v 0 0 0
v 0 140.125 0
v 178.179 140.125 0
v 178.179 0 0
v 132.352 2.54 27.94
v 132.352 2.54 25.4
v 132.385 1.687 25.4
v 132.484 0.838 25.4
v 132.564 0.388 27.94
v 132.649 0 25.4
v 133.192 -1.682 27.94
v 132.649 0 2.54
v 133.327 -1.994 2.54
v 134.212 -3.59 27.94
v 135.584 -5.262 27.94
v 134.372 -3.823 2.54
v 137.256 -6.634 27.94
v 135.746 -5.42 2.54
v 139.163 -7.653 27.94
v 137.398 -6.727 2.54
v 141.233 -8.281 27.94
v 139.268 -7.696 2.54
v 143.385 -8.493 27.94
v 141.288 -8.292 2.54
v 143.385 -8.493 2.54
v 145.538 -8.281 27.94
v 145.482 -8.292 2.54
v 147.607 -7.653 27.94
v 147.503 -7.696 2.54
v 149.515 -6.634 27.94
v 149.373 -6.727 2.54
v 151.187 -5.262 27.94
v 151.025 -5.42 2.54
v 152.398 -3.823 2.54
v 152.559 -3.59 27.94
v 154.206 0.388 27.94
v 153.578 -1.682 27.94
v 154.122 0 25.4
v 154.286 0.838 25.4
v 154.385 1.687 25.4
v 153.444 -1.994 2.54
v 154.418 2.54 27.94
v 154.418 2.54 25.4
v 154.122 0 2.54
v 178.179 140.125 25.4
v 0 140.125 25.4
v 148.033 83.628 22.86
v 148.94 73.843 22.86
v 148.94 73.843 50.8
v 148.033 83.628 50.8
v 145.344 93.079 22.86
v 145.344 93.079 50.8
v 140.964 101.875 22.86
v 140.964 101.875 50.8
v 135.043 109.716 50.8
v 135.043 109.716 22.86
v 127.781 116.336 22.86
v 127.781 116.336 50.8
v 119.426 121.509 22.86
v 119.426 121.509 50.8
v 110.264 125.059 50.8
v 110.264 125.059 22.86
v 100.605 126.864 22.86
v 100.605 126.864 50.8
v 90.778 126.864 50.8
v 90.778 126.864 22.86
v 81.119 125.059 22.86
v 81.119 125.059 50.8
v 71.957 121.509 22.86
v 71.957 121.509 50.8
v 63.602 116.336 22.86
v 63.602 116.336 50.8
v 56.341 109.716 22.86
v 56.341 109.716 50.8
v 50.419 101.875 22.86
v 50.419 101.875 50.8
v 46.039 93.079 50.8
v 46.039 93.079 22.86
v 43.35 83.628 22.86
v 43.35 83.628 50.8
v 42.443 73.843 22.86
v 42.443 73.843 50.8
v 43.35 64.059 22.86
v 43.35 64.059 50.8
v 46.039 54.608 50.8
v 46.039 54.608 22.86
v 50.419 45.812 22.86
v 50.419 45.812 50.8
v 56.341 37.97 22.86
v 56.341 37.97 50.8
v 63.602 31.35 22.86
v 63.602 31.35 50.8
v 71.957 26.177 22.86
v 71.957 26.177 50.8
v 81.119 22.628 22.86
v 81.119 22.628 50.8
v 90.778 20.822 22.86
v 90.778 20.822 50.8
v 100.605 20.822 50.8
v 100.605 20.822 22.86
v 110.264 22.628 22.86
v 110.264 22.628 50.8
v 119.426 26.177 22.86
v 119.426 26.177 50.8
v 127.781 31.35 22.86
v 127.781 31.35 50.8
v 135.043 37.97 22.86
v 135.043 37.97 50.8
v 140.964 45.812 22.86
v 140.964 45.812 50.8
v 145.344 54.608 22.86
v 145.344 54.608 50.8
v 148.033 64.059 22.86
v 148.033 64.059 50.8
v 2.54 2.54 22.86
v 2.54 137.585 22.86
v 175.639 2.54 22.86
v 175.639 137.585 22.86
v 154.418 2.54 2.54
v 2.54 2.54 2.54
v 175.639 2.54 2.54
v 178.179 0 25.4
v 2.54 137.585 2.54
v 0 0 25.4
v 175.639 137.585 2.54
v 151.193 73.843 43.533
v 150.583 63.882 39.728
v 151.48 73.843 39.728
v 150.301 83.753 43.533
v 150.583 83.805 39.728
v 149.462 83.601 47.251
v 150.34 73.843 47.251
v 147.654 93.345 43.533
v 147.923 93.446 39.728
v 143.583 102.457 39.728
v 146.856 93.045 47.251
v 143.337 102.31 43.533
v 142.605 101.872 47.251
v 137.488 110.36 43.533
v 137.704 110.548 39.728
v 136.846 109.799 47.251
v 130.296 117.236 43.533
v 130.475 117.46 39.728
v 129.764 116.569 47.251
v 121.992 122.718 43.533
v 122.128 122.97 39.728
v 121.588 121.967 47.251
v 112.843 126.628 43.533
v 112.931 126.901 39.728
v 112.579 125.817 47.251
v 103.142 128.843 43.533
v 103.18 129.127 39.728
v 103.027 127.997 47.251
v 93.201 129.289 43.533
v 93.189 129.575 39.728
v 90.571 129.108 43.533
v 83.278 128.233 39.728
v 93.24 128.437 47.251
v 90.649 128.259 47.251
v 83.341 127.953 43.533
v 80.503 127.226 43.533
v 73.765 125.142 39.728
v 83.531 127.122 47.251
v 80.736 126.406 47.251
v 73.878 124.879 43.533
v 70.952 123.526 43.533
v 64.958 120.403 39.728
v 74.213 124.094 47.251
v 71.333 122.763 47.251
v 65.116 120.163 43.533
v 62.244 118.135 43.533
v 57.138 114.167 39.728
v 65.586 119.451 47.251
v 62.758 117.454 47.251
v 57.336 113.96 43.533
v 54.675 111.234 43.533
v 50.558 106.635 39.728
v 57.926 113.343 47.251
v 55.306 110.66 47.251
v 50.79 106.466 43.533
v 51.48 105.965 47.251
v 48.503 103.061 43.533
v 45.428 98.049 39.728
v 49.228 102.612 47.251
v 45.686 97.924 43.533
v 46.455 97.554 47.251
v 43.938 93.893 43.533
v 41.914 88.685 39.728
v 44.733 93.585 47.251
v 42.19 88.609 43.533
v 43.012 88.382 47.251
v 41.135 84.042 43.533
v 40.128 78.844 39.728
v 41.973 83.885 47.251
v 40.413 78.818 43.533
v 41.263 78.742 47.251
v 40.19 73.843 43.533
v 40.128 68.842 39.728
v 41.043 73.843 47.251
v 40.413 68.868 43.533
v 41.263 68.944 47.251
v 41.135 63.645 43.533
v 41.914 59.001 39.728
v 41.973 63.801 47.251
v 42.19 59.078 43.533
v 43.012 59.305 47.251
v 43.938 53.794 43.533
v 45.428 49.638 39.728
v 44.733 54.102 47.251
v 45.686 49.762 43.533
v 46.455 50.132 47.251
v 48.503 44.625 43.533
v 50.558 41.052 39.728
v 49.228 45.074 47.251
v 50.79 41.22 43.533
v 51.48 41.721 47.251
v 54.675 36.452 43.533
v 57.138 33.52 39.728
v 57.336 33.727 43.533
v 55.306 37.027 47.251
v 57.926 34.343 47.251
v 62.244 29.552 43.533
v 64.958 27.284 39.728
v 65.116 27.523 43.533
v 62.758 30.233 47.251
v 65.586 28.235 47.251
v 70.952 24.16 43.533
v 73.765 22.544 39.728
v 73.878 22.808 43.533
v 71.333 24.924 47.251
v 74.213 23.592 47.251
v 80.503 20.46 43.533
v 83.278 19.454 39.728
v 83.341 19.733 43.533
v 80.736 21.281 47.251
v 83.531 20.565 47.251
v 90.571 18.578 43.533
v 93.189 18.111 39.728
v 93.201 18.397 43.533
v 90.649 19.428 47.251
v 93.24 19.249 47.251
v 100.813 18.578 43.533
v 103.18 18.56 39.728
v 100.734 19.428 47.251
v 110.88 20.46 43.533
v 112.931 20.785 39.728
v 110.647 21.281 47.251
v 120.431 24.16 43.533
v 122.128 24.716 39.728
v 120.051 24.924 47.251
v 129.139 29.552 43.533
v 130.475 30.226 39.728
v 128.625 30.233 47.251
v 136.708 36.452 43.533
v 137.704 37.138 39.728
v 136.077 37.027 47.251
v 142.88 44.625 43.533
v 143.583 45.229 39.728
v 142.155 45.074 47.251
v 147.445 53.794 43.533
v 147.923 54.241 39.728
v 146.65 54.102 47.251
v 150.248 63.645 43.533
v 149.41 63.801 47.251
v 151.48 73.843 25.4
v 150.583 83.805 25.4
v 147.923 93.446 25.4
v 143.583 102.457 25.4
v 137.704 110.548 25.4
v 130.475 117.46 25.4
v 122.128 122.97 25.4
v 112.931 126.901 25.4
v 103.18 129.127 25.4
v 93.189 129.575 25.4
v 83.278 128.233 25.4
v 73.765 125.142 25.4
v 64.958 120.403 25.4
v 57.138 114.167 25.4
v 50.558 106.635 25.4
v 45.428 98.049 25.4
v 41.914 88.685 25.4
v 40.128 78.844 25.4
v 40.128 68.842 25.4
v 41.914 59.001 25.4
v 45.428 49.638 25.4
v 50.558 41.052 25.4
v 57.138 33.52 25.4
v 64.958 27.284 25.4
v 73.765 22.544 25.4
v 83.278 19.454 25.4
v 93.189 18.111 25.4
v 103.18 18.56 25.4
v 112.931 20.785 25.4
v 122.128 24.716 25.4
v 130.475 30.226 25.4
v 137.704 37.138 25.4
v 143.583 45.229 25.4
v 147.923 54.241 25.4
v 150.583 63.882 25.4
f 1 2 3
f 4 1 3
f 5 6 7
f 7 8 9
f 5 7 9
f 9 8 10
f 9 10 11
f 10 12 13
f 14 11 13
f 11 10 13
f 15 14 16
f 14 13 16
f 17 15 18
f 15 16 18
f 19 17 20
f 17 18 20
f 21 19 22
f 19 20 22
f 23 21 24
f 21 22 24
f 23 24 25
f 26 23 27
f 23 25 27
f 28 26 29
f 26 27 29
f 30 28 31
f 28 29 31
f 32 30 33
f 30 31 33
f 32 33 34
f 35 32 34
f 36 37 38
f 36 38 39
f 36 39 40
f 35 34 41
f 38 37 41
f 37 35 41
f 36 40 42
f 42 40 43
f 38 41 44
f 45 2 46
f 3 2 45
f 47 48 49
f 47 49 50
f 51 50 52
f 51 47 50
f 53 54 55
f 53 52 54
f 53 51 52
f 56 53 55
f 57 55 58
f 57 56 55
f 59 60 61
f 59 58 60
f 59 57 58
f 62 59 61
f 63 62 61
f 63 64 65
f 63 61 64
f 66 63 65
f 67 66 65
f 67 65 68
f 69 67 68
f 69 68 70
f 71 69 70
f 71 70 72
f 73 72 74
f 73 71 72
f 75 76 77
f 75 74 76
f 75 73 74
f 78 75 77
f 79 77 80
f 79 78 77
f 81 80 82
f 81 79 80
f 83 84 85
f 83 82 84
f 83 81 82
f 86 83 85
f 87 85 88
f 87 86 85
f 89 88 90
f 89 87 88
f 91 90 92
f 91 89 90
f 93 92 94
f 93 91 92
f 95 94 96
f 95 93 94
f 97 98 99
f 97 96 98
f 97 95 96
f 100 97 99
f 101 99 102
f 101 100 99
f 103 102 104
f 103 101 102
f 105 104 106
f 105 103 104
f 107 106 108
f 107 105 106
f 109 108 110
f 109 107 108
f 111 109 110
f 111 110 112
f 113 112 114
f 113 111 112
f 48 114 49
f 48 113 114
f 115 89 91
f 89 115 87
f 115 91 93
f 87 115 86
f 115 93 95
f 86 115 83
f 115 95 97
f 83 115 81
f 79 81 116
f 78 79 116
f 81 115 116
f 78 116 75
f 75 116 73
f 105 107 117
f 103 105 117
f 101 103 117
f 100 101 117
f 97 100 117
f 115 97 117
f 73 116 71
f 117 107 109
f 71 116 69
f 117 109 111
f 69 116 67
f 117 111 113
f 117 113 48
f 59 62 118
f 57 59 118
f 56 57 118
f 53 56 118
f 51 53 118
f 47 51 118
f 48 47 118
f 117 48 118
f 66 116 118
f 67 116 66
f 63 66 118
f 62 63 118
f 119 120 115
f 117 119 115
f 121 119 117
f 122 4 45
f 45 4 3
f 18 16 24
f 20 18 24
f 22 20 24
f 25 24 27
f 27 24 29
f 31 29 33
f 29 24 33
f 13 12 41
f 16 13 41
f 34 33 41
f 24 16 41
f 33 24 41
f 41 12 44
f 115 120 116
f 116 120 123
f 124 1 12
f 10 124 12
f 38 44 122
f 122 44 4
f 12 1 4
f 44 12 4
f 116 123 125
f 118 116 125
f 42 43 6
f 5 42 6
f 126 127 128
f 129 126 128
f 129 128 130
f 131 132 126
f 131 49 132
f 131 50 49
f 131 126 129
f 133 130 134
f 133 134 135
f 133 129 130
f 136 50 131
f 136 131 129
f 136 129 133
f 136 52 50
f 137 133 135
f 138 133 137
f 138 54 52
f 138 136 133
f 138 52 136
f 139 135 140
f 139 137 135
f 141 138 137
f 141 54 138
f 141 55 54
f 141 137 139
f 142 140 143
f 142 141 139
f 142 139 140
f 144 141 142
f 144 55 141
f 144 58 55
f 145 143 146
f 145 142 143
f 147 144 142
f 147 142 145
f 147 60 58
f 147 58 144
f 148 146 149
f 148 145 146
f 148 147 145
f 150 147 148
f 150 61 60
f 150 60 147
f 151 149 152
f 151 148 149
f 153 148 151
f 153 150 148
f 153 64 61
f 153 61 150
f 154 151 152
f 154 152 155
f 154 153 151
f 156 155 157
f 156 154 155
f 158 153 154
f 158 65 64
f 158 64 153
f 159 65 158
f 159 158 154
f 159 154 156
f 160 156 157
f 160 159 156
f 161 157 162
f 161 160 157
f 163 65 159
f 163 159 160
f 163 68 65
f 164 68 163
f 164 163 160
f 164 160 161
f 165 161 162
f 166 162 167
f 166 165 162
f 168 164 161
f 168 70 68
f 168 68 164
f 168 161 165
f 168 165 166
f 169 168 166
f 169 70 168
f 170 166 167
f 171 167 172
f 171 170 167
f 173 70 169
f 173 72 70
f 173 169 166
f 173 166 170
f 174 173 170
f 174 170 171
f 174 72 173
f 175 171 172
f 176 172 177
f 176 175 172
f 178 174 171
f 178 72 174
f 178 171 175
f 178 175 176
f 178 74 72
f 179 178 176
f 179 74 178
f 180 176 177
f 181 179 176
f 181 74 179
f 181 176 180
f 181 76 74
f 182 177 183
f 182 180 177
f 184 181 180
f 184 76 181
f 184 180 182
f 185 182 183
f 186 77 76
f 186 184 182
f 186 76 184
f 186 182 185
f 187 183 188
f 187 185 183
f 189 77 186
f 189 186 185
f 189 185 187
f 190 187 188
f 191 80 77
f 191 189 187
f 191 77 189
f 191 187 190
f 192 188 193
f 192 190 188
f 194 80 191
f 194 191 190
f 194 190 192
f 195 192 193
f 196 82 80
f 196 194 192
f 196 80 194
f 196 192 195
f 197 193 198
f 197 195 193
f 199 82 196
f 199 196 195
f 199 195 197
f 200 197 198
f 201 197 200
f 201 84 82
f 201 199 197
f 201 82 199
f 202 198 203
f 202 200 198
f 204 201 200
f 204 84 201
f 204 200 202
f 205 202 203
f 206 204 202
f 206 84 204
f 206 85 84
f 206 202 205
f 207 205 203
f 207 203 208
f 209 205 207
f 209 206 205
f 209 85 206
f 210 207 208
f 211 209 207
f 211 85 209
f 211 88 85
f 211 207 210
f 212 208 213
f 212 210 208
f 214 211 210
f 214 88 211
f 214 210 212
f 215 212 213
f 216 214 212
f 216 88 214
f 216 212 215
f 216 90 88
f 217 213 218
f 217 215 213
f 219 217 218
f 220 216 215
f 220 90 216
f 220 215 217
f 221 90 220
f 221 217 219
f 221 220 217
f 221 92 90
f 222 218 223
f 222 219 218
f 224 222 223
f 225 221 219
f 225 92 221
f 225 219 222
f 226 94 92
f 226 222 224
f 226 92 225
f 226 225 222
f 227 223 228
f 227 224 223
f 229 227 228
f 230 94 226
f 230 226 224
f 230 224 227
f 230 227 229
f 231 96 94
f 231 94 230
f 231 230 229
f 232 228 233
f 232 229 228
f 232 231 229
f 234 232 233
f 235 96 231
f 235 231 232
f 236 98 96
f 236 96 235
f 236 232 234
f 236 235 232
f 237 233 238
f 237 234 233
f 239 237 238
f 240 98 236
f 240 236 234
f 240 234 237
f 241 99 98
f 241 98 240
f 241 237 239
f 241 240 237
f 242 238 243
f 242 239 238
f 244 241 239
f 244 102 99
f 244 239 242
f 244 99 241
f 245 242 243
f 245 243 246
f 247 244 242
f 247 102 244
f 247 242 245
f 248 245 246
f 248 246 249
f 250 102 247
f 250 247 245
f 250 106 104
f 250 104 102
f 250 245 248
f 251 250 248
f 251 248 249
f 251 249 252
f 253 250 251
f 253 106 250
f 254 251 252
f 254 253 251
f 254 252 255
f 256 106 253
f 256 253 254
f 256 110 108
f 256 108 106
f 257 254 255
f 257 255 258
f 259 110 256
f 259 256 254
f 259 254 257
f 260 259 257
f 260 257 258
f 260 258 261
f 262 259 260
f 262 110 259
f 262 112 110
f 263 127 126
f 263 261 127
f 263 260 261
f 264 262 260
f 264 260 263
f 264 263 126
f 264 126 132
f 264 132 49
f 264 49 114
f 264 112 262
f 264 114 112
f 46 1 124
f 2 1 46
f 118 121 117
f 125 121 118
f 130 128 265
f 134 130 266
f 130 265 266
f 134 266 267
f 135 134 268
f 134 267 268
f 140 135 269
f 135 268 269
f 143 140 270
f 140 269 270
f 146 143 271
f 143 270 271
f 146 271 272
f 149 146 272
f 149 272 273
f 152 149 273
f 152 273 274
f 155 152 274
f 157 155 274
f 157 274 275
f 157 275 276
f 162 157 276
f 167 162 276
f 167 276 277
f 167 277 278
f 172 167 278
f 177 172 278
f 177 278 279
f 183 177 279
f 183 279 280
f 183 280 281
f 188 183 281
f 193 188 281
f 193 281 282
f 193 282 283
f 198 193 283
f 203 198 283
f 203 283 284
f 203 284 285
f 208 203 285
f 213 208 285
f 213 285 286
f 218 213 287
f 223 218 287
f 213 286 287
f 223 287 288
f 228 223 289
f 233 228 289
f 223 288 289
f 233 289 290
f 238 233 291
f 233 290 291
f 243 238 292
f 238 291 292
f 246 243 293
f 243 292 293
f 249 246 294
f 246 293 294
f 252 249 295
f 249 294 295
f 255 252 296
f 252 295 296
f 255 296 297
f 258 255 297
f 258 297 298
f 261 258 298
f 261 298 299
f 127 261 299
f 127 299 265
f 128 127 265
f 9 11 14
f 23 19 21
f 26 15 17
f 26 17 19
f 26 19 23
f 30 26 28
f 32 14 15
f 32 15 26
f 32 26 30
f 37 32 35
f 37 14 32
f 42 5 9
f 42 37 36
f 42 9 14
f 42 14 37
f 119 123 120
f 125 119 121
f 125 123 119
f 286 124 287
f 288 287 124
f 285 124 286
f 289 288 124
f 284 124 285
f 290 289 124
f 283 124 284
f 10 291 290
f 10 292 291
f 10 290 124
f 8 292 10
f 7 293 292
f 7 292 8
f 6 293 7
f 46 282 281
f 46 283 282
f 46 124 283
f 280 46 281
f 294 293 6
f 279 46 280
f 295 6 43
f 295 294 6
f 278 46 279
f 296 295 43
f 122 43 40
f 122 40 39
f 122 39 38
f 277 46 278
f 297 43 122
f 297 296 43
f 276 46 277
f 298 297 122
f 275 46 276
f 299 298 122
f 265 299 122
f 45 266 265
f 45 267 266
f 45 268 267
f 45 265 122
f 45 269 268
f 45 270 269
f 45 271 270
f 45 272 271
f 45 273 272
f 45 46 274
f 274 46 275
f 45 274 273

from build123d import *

# Parameters (mm, degrees)
F0_W     = 178.1788319349
F0_H     = 140.1249915361
F1_DEPTH = 25.4
F2_R     = 55.7882871659
F3_DEPTH = 25.4
F4_T     = -2.54
F7_DEPTH = 25.4


# Not quite as in the source:
# - a fillet or chamfer that OpenCascade refuses, or shapes differently, is made with other operations: its cross-section is extruded or revolved along the edge and cut away or added


with BuildPart() as f1:
    # F0 (on Top) → F1 (new body)
    with BuildSketch(Plane.XY):
        with Locations((89.0894159675, 70.0624957681)):
            Rectangle(F0_W, F0_H)
    extrude(amount=F1_DEPTH)

    # F2 (on face) → F3 (join)
    with BuildSketch(Plane.XY.offset(25.4)):
        with Locations((95.6915691495, 73.8431587815)):
            Circle(F2_R)
    extrude(amount=F3_DEPTH)

    # F4
    f4_openings = [f1.faces().sort_by_distance(p)[0] for p in [
        (95.691569, 73.843159, 50.8),
    ]]
    offset(amount=F4_T, openings=f4_openings, kind=Kind.INTERSECTION)

    # F5: fillet of radius 25.4 on 1 edges, made by hand

    # F5_s1 → F5_t2 (revolve, cut)
    with BuildSketch(Plane.XZ.offset(-73.8431587815)):
        with BuildLine():
            ThreePointArc((151.4798563154, 39.7283966834), (150.8367139512, 45.4080093463), (148.9398563154, 50.8))
            Line((148.9398563154, 50.8), (151.4798563154, 50.8))
            Line((151.4798563154, 50.8), (151.4798563154, 39.7283966834))
        make_face()
    revolve(axis=Axis((95.6915691495, 73.8431587815, 50.8), (0, 0, 1)), mode=Mode.SUBTRACT)

    # F6 (on face) → F7 (join)
    with BuildSketch(Plane.XY.offset(2.54)):
        with BuildLine():
            ThreePointArc((132.352274685, 2.54), (143.3852910995, -8.4930164146), (154.4183075141, 2.54))
            Line((154.4183075141, 2.54), (132.352274685, 2.54))
        make_face()
    extrude(amount=F7_DEPTH)


solid = f1.part
